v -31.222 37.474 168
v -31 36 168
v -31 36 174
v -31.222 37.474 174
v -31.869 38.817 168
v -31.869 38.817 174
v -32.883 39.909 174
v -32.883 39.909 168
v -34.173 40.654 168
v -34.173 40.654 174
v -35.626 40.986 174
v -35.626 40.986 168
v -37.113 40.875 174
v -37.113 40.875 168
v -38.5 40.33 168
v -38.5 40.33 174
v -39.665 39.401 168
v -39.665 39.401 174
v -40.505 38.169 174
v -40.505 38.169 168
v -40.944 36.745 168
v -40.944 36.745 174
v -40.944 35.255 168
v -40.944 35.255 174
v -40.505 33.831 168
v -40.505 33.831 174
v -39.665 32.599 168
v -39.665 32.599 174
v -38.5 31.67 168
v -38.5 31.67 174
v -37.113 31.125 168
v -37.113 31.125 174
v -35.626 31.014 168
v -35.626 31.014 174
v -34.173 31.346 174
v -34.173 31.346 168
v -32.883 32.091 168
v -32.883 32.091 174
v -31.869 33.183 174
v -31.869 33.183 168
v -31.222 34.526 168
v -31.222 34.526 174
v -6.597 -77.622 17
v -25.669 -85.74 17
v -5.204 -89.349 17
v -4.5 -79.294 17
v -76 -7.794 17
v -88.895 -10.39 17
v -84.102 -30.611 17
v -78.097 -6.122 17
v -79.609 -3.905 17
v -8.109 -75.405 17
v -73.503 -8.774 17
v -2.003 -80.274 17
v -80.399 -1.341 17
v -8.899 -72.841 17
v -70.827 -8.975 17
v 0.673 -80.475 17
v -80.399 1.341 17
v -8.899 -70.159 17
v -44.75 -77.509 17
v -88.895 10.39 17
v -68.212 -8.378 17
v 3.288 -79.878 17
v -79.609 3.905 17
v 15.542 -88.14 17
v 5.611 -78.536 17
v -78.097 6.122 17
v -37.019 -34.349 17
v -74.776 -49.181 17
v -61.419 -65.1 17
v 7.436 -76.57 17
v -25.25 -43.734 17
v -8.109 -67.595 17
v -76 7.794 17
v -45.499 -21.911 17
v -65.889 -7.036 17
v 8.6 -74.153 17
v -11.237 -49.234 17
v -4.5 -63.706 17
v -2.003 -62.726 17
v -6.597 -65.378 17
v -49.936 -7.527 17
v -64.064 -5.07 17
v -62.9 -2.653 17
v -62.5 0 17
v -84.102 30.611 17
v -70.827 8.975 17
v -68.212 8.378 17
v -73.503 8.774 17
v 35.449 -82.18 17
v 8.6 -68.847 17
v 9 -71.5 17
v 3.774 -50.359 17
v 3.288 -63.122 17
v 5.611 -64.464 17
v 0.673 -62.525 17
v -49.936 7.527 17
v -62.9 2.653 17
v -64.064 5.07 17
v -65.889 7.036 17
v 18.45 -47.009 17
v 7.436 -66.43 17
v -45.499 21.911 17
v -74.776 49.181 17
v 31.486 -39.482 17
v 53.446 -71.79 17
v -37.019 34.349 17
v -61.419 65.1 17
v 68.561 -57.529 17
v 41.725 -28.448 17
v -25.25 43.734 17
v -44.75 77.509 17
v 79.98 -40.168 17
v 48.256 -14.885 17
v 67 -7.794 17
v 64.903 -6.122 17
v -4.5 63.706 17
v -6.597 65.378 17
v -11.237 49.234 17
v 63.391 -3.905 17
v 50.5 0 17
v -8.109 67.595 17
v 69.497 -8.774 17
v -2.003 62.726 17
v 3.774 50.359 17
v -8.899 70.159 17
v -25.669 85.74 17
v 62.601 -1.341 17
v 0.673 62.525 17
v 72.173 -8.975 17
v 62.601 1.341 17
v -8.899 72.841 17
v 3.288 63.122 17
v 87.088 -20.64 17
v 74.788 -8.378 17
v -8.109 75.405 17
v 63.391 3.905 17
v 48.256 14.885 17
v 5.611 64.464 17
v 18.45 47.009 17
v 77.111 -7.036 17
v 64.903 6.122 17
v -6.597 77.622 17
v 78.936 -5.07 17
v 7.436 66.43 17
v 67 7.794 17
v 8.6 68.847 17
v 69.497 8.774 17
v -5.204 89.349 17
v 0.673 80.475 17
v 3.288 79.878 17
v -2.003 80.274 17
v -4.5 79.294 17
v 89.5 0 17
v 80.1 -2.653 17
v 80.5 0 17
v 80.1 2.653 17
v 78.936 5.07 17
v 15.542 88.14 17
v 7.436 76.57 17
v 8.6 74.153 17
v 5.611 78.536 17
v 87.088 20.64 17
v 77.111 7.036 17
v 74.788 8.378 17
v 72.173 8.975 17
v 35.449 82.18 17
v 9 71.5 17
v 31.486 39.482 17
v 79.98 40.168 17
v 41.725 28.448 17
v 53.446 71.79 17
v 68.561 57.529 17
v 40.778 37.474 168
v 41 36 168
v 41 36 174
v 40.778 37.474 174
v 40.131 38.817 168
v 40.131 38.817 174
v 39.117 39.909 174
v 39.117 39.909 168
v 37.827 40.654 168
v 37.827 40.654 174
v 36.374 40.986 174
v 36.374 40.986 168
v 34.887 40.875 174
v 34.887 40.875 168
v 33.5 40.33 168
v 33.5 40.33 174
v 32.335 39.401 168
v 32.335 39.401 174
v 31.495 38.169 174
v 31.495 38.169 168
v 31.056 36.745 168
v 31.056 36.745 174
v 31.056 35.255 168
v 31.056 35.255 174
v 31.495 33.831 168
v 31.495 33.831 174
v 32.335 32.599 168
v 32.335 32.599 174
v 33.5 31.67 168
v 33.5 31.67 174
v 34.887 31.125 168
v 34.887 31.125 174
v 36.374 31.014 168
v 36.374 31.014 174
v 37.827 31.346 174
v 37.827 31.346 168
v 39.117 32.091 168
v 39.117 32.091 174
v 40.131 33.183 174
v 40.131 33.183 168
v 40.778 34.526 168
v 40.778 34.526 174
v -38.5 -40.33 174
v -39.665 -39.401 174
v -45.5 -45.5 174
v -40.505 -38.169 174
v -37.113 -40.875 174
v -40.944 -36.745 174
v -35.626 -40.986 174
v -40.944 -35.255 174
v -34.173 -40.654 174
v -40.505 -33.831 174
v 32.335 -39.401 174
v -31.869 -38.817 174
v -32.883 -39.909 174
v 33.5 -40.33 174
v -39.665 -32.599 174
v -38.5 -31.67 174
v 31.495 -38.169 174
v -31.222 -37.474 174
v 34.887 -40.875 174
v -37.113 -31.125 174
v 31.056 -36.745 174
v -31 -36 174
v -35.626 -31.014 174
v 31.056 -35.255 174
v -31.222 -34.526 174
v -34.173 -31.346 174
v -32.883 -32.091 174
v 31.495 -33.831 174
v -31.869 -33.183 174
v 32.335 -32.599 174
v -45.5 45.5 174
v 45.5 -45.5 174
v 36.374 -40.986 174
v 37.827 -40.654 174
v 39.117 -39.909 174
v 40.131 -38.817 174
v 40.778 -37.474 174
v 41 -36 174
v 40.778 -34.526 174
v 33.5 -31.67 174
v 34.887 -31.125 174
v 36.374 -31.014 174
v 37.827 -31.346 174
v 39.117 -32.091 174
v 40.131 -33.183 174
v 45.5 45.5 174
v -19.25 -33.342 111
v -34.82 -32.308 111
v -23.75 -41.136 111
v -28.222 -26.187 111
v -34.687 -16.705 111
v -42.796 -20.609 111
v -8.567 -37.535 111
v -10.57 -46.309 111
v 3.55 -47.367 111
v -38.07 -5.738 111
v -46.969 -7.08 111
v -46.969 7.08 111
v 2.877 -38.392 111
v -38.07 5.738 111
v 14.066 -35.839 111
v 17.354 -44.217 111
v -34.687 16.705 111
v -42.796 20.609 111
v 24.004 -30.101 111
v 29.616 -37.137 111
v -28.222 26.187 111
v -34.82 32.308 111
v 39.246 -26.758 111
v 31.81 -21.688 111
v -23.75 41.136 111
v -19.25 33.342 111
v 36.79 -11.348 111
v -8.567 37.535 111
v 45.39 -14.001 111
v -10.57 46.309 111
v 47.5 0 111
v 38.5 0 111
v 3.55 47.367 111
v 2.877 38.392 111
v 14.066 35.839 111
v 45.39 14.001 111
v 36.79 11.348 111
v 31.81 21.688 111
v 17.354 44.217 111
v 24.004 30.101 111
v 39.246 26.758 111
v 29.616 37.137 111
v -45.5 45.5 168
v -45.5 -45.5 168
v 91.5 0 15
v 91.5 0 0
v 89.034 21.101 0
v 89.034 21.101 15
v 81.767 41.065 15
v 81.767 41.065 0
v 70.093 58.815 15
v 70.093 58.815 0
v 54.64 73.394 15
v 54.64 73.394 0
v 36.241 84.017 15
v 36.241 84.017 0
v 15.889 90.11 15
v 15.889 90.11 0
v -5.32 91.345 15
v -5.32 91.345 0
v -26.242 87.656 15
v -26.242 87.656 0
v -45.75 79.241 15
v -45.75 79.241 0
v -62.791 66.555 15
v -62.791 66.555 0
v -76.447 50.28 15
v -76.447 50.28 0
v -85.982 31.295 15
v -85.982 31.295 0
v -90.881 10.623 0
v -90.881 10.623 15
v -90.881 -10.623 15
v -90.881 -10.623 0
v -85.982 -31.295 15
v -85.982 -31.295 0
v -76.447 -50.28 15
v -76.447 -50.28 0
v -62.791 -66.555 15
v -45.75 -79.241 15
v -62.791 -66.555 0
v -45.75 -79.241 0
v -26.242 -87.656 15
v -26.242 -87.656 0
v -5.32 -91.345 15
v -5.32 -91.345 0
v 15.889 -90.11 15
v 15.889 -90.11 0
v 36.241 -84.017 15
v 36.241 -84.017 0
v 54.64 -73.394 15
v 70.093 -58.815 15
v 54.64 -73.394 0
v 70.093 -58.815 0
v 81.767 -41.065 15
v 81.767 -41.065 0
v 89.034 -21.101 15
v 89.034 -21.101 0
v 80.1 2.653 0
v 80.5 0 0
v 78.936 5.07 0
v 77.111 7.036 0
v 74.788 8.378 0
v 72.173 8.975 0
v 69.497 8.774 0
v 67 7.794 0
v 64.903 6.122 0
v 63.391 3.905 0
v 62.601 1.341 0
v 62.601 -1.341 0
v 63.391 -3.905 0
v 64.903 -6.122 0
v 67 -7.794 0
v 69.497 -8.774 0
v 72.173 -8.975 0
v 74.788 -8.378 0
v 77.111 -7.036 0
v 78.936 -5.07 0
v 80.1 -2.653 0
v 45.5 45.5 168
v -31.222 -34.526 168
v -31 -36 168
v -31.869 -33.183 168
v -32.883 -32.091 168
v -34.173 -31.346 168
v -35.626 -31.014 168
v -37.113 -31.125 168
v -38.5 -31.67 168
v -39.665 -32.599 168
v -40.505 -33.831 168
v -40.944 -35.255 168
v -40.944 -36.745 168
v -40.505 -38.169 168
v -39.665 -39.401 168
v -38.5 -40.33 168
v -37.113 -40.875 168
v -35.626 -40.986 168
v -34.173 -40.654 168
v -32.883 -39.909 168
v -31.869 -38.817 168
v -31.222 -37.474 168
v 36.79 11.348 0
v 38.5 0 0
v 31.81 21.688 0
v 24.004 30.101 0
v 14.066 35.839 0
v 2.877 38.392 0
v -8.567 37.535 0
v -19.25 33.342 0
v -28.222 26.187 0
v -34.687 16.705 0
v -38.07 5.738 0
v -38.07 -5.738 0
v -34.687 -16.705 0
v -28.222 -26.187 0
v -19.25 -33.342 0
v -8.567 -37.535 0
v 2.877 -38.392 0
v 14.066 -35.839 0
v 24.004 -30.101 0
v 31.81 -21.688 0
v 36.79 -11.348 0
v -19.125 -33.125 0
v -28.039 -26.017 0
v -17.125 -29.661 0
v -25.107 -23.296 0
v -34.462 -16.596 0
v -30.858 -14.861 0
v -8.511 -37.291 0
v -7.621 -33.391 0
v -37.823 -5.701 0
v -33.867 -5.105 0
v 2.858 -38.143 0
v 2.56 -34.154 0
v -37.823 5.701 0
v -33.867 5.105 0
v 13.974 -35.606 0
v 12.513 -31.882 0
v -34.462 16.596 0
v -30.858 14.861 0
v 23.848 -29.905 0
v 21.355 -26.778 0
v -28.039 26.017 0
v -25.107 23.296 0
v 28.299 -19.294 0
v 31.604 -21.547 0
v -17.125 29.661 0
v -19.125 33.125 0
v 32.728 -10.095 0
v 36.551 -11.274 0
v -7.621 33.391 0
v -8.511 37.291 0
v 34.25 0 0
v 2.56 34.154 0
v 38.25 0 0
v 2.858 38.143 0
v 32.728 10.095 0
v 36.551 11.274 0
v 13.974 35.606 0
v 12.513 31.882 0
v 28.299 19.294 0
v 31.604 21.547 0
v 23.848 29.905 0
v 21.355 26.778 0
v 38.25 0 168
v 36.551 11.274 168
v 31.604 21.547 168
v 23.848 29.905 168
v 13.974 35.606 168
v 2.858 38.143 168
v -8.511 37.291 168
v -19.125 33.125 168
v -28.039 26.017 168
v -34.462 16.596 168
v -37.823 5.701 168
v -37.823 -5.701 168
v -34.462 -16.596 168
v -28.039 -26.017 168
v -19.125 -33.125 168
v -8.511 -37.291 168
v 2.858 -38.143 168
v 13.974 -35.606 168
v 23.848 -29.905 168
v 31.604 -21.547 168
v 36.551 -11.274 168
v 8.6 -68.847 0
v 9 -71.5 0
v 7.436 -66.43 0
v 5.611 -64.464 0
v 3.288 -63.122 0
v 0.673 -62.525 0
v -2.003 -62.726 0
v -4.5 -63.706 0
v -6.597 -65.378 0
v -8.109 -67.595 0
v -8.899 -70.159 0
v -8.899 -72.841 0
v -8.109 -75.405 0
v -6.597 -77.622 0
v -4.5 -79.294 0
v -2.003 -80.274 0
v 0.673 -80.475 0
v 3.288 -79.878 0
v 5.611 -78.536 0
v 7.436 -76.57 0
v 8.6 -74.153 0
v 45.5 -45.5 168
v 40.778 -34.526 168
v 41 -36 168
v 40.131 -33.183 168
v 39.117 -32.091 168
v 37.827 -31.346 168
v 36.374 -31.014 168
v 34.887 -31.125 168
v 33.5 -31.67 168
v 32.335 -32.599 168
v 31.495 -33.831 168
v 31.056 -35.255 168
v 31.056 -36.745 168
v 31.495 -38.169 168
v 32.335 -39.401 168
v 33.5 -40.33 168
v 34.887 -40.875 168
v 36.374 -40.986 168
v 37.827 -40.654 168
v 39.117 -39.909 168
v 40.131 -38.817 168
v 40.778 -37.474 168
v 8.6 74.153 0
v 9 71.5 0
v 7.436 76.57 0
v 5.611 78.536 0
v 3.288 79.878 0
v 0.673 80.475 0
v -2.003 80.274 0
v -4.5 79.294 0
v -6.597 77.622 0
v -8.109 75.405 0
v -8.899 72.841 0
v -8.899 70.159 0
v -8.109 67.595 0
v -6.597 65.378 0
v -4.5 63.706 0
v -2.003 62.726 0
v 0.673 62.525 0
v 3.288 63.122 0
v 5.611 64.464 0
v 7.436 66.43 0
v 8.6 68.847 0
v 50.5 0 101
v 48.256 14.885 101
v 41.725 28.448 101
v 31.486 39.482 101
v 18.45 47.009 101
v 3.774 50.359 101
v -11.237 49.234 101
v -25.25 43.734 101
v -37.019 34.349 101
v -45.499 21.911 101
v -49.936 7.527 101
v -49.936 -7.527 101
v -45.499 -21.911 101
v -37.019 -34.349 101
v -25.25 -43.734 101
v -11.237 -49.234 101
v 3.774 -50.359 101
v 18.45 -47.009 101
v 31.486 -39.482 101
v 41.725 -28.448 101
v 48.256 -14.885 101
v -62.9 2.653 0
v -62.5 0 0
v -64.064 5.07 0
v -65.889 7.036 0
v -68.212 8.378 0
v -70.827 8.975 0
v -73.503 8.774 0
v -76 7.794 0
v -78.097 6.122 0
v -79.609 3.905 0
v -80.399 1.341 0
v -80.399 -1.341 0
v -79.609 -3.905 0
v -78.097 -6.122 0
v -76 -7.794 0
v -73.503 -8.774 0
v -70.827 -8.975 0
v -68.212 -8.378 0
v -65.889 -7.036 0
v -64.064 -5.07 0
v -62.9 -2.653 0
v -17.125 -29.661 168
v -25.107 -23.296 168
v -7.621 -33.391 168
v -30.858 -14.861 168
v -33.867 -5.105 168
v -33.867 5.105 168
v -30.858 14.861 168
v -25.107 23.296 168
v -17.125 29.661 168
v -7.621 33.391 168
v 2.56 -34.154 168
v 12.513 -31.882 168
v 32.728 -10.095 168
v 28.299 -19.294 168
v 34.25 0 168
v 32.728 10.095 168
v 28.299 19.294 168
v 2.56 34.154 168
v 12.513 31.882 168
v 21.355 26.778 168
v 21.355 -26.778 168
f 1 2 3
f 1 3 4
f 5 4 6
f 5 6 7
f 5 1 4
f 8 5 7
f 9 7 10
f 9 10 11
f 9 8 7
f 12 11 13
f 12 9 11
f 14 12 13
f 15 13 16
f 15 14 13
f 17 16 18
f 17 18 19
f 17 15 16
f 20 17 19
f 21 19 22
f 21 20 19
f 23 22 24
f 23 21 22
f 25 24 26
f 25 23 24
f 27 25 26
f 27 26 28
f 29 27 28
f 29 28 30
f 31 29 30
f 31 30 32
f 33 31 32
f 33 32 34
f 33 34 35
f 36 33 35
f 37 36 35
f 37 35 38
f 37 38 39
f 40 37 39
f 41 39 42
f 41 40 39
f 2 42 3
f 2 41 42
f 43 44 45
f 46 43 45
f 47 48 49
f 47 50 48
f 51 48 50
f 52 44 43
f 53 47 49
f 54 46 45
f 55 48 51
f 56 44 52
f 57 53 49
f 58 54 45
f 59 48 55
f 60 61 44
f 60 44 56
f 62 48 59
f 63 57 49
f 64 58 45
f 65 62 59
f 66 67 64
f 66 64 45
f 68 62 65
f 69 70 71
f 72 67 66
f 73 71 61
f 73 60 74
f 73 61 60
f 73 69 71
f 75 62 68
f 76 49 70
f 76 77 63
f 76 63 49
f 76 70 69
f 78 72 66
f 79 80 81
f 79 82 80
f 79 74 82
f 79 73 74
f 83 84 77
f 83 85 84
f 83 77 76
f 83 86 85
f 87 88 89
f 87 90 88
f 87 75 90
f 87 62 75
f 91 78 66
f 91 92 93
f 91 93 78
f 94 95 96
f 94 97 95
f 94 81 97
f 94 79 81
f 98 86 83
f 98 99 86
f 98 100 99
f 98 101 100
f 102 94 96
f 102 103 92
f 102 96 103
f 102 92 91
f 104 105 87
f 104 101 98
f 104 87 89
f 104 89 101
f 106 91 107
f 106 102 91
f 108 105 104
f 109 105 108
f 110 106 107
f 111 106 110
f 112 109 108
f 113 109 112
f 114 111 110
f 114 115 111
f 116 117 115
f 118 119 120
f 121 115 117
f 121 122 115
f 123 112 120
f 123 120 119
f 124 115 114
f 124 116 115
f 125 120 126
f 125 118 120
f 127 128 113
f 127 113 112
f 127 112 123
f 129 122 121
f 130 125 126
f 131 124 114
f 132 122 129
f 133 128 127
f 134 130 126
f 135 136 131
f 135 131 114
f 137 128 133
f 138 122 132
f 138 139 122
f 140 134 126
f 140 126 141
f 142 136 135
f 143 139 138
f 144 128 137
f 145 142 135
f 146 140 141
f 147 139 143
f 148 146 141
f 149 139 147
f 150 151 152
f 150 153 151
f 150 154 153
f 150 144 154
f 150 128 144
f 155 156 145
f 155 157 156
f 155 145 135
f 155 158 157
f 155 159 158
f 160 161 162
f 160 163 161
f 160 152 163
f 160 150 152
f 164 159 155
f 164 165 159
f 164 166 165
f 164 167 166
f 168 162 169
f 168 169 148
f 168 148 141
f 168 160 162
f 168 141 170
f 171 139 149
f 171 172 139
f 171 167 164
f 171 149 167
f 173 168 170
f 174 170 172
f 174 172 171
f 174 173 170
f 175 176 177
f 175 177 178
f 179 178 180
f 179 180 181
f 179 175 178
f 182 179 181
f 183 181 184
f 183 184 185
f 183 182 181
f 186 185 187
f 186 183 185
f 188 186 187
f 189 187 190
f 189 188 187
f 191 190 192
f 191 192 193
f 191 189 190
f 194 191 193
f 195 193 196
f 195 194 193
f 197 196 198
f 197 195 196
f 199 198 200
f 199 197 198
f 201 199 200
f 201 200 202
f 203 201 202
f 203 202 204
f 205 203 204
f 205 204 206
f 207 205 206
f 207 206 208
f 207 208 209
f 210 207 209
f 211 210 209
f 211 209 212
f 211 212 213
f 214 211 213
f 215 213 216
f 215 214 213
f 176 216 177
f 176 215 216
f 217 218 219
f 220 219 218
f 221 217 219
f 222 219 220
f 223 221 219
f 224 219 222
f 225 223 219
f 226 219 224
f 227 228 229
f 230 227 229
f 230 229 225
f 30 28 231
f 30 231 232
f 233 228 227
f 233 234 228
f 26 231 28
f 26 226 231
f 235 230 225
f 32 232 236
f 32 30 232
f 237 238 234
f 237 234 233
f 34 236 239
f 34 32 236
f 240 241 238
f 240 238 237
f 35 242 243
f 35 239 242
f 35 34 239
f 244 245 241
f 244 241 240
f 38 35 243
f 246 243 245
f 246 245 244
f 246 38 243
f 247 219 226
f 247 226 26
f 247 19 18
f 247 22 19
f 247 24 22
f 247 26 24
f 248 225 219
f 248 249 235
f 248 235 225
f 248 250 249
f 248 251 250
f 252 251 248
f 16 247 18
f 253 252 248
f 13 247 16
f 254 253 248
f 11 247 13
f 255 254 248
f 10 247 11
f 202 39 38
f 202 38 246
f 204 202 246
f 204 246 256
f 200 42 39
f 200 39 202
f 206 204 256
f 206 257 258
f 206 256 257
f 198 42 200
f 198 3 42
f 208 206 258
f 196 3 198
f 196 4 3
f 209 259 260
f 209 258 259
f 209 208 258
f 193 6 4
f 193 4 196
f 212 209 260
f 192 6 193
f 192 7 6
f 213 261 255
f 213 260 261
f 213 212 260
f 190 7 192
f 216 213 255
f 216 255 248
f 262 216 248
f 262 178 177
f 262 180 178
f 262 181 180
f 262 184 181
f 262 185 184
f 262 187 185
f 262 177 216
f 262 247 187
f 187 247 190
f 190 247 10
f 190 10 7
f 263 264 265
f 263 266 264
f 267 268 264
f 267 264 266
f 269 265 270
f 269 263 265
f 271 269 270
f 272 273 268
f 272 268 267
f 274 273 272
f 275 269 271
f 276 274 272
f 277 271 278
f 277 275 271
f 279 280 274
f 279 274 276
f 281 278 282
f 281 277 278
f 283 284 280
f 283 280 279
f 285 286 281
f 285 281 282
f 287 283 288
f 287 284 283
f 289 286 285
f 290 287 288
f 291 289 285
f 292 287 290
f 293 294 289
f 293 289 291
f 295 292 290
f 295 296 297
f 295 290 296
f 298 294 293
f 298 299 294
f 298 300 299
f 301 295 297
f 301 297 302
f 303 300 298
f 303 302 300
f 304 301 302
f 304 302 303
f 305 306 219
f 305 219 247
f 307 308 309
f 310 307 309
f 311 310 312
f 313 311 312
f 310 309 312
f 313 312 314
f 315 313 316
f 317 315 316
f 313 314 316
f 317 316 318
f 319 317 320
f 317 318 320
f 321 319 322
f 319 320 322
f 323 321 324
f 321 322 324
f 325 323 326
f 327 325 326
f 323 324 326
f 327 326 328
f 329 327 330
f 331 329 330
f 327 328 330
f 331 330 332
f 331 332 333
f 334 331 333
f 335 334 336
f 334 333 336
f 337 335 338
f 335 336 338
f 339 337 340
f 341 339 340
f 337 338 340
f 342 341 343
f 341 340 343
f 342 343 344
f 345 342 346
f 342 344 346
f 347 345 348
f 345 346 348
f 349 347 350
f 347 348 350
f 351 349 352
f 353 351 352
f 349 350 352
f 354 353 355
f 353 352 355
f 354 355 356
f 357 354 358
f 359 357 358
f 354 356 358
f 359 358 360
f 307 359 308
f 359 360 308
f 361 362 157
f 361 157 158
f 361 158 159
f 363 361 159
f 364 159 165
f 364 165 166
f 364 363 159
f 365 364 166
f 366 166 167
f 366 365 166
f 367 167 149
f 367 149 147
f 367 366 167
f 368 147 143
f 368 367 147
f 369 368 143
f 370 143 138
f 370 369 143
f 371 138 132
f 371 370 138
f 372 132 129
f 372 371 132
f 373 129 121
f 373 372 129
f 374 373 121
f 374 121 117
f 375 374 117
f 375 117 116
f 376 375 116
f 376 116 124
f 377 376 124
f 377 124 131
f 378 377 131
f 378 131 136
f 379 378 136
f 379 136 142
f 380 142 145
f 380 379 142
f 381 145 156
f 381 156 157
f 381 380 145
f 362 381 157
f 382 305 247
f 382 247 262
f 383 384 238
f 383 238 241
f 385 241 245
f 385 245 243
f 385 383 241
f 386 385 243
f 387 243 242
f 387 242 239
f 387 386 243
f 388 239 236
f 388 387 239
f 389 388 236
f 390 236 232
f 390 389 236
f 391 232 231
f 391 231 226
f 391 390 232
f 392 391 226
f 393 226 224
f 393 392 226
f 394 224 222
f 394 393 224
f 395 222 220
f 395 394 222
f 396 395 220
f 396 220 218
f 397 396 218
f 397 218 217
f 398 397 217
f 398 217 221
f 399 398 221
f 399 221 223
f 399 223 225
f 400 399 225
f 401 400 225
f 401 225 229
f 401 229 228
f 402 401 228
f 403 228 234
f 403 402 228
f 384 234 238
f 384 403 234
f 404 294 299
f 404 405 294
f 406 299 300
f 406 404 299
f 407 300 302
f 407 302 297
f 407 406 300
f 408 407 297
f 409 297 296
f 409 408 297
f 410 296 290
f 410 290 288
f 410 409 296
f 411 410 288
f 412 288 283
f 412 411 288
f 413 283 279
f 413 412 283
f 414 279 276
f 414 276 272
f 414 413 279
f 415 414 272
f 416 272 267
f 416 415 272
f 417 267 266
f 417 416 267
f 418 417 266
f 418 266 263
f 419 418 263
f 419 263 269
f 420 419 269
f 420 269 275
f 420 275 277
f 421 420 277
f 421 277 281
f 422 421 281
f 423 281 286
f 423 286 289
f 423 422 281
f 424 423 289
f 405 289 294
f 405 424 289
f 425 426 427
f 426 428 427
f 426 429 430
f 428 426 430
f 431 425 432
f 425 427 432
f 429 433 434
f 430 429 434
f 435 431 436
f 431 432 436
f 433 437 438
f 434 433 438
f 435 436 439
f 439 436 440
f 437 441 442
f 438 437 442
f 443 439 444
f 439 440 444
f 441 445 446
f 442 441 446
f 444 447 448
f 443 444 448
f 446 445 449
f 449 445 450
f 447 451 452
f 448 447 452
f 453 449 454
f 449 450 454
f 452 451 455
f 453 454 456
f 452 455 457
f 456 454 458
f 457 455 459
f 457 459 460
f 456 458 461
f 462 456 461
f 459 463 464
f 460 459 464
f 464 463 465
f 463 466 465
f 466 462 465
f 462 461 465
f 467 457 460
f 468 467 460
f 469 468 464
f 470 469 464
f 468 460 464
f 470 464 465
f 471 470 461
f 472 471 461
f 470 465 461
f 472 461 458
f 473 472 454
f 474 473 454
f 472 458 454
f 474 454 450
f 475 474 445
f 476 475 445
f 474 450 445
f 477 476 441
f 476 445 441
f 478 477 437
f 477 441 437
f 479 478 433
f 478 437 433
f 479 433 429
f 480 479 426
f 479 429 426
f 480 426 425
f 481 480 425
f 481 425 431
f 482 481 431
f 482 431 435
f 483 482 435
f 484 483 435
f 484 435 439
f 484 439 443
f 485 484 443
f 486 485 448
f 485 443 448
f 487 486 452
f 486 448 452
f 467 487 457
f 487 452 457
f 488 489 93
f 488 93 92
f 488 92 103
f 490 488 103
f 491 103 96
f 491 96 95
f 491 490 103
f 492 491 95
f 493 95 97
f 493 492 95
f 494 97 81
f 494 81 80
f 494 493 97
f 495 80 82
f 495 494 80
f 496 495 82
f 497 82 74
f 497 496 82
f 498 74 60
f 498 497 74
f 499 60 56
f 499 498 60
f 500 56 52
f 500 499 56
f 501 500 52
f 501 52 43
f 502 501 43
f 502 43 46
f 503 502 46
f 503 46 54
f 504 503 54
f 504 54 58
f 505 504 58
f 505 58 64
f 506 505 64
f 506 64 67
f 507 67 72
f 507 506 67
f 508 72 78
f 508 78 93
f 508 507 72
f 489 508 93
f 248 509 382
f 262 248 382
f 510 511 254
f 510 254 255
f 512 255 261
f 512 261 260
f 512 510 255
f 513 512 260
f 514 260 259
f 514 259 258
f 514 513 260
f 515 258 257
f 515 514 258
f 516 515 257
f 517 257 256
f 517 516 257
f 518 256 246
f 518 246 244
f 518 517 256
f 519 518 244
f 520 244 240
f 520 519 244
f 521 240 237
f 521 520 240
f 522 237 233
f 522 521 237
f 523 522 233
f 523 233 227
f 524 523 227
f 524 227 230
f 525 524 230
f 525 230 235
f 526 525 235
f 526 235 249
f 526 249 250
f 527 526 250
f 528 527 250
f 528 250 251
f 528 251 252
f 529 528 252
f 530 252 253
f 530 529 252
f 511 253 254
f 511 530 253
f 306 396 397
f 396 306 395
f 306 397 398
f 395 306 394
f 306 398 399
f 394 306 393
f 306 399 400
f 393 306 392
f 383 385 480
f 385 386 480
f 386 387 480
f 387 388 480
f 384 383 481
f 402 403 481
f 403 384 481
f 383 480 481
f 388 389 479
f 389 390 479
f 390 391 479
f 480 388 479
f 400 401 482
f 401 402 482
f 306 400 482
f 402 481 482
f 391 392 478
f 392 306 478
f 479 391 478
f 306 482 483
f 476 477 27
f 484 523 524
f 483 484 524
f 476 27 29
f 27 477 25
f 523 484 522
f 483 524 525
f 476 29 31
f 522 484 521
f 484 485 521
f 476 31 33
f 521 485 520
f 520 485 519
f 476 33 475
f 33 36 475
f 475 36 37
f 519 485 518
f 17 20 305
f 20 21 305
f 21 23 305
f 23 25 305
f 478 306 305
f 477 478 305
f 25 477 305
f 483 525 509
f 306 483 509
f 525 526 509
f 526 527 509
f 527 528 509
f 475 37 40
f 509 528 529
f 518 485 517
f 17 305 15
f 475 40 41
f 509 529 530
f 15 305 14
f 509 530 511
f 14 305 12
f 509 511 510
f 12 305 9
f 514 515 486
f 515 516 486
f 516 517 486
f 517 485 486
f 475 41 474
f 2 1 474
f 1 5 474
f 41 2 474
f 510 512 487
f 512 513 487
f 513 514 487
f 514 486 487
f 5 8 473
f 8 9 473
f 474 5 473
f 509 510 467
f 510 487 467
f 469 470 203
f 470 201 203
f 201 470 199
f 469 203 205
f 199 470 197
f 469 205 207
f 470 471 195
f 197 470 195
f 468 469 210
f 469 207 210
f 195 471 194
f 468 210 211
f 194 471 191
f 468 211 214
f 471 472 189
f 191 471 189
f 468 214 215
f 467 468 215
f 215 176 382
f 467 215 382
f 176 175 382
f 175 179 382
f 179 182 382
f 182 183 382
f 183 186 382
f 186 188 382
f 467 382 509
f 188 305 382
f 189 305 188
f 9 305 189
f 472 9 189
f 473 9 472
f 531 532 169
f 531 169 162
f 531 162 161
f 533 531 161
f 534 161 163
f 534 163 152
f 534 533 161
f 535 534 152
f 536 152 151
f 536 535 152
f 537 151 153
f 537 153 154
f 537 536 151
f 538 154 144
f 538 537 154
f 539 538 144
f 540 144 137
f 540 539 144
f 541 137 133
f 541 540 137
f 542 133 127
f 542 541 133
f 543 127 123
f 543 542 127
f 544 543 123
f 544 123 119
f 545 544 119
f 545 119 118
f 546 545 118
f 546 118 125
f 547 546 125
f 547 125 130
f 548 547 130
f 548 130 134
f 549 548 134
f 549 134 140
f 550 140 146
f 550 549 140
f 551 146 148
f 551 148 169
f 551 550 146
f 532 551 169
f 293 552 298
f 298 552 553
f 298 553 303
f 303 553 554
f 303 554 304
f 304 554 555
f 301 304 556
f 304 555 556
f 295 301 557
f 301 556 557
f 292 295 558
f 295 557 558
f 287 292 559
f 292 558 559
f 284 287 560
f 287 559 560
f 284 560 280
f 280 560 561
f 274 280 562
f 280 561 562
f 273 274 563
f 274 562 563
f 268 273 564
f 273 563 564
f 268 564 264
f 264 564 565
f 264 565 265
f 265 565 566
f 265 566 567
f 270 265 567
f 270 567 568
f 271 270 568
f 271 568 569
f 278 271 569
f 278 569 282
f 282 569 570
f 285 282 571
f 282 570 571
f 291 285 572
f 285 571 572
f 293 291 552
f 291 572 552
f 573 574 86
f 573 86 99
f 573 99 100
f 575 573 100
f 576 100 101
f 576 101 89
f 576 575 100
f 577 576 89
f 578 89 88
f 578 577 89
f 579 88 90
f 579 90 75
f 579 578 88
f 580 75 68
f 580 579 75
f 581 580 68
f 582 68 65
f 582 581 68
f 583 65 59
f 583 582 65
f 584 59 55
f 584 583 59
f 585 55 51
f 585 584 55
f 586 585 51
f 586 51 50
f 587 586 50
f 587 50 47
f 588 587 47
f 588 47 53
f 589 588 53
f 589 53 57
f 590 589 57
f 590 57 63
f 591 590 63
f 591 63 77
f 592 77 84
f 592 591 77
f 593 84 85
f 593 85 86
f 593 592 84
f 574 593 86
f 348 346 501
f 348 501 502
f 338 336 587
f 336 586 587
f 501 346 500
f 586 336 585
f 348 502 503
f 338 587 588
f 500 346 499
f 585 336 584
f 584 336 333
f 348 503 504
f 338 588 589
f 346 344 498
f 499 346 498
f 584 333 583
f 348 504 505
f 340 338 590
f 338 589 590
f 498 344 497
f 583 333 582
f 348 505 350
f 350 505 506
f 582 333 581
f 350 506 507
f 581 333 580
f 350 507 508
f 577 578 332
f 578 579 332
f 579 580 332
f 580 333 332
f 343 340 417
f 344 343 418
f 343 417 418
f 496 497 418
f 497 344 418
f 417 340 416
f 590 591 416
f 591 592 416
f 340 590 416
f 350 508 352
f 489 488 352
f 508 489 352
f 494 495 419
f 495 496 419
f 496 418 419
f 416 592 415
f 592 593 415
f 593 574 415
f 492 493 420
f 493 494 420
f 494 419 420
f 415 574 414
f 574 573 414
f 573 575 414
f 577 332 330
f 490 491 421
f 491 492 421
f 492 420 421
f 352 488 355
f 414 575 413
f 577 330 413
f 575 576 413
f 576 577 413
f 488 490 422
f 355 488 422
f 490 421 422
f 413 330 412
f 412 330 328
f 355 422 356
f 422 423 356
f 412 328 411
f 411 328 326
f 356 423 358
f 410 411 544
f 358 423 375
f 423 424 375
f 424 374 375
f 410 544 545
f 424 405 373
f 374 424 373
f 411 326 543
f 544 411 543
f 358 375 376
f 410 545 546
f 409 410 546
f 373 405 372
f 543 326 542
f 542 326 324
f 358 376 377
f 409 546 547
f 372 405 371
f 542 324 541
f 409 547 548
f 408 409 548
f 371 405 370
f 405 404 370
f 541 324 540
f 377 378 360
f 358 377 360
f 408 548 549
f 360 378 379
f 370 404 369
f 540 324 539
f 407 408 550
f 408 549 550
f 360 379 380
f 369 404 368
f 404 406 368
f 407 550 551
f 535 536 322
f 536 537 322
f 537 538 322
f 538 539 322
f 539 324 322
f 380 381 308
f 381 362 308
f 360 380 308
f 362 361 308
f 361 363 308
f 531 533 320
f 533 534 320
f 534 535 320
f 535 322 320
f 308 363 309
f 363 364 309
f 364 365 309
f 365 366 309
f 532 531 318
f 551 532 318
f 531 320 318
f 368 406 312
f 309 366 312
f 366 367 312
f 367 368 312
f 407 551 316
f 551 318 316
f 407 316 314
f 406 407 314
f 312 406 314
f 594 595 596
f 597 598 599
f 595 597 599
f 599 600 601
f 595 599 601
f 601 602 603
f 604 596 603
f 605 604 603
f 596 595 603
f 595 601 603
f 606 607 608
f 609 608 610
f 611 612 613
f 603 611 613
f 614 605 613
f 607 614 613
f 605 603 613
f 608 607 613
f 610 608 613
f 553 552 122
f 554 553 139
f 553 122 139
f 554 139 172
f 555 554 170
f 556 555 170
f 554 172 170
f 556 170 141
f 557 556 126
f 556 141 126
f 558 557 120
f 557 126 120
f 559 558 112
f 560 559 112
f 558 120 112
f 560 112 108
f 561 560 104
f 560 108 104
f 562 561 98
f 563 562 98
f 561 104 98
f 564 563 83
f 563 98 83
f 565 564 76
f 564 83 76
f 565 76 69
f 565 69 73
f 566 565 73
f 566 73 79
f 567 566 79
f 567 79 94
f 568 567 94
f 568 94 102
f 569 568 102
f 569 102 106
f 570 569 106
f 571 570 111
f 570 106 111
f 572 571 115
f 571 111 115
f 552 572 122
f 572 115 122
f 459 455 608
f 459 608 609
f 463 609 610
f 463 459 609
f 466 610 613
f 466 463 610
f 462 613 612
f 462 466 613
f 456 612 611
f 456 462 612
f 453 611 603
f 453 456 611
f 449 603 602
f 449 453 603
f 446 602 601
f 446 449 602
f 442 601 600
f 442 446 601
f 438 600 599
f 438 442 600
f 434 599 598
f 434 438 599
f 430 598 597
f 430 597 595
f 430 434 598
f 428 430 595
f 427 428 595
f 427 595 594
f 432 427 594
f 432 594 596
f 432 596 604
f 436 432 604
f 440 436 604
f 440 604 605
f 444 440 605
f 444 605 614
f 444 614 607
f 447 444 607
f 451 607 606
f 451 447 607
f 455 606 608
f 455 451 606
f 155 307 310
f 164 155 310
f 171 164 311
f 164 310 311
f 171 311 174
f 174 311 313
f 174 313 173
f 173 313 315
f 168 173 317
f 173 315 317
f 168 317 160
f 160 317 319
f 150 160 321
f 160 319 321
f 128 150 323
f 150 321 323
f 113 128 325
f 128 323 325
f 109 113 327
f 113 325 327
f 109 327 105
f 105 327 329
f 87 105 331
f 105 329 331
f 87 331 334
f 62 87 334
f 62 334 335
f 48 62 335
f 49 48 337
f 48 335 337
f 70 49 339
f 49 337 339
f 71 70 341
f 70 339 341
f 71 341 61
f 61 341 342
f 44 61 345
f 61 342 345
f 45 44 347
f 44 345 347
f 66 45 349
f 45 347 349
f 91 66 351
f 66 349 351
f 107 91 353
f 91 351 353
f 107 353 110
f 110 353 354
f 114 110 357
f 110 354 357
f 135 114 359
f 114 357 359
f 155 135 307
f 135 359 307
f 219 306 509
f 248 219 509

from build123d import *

# Parameters (mm, degrees)
F0_R     = 91.5
F0_R_2   = 9
F0_R_3   = 38.5
F1_DEPTH = 17
F2_R     = 50.5
F2_R_2   = 38.5
F3_DEPTH = 94
F4_SIZE2 = 10
F4_SIZE  = 3
F5_SIZE  = 2
F6_R     = 38.25
F6_R_2   = 34.25
F7_DEPTH = 168
F8_W     = 91
F8_H     = 91
F8_R     = 5
F9_DEPTH = 6


with BuildPart() as f1:
    # F0 (on Top) → F1 (new body)
    with BuildSketch(Plane.XY):
        Circle(F0_R)
        with Locations((0, -71.5)):
            Circle(F0_R_2, mode=Mode.SUBTRACT)
        with Locations((-71.5, 0)):
            Circle(F0_R_2, mode=Mode.SUBTRACT)
        Circle(F0_R_3, mode=Mode.SUBTRACT)
        with Locations((71.5, 0)):
            Circle(F0_R_2, mode=Mode.SUBTRACT)
        with Locations((0, 71.5)):
            Circle(F0_R_2, mode=Mode.SUBTRACT)
    extrude(amount=F1_DEPTH)

    # F2 (on face) → F3 (join)
    with BuildSketch(Plane.XY.offset(17)):
        Circle(F2_R)
        Circle(F2_R_2, mode=Mode.SUBTRACT)
    extrude(amount=F3_DEPTH)

    # F4
    f4_edges = [f1.edges().sort_by_distance(p)[0] for p in [
        (-50.5, 0, 111),
    ]]
    f4_side = f1.faces().sort_by_distance((-49.071644, 0, 111))[0]
    chamfer(f4_edges, length=F4_SIZE, length2=F4_SIZE2, reference=f4_side)

    # F5
    f5_edges = [f1.edges().sort_by_distance(p)[0] for p in [
        (-91.5, 0, 17),
    ]]
    chamfer(f5_edges, length=F5_SIZE)


with BuildPart() as f7:
    # F6 (on Top) → F7 (new body)
    with BuildSketch(Plane.XY):
        Circle(F6_R)
        Circle(F6_R_2, mode=Mode.SUBTRACT)
    extrude(amount=F7_DEPTH)

    # F8 (on face) → F9 (join)
    with BuildSketch(Plane.XY.offset(168)):
        Rectangle(F8_W, F8_H)
        with Locations((-36, -36)):
            Circle(F8_R, mode=Mode.SUBTRACT)
        with Locations((36, -36)):
            Circle(F8_R, mode=Mode.SUBTRACT)
        with Locations((-36, 36)):
            Circle(F8_R, mode=Mode.SUBTRACT)
        with Locations((36, 36)):
            Circle(F8_R, mode=Mode.SUBTRACT)
    extrude(amount=F9_DEPTH)


solid = Compound([f1.part, f7.part])
